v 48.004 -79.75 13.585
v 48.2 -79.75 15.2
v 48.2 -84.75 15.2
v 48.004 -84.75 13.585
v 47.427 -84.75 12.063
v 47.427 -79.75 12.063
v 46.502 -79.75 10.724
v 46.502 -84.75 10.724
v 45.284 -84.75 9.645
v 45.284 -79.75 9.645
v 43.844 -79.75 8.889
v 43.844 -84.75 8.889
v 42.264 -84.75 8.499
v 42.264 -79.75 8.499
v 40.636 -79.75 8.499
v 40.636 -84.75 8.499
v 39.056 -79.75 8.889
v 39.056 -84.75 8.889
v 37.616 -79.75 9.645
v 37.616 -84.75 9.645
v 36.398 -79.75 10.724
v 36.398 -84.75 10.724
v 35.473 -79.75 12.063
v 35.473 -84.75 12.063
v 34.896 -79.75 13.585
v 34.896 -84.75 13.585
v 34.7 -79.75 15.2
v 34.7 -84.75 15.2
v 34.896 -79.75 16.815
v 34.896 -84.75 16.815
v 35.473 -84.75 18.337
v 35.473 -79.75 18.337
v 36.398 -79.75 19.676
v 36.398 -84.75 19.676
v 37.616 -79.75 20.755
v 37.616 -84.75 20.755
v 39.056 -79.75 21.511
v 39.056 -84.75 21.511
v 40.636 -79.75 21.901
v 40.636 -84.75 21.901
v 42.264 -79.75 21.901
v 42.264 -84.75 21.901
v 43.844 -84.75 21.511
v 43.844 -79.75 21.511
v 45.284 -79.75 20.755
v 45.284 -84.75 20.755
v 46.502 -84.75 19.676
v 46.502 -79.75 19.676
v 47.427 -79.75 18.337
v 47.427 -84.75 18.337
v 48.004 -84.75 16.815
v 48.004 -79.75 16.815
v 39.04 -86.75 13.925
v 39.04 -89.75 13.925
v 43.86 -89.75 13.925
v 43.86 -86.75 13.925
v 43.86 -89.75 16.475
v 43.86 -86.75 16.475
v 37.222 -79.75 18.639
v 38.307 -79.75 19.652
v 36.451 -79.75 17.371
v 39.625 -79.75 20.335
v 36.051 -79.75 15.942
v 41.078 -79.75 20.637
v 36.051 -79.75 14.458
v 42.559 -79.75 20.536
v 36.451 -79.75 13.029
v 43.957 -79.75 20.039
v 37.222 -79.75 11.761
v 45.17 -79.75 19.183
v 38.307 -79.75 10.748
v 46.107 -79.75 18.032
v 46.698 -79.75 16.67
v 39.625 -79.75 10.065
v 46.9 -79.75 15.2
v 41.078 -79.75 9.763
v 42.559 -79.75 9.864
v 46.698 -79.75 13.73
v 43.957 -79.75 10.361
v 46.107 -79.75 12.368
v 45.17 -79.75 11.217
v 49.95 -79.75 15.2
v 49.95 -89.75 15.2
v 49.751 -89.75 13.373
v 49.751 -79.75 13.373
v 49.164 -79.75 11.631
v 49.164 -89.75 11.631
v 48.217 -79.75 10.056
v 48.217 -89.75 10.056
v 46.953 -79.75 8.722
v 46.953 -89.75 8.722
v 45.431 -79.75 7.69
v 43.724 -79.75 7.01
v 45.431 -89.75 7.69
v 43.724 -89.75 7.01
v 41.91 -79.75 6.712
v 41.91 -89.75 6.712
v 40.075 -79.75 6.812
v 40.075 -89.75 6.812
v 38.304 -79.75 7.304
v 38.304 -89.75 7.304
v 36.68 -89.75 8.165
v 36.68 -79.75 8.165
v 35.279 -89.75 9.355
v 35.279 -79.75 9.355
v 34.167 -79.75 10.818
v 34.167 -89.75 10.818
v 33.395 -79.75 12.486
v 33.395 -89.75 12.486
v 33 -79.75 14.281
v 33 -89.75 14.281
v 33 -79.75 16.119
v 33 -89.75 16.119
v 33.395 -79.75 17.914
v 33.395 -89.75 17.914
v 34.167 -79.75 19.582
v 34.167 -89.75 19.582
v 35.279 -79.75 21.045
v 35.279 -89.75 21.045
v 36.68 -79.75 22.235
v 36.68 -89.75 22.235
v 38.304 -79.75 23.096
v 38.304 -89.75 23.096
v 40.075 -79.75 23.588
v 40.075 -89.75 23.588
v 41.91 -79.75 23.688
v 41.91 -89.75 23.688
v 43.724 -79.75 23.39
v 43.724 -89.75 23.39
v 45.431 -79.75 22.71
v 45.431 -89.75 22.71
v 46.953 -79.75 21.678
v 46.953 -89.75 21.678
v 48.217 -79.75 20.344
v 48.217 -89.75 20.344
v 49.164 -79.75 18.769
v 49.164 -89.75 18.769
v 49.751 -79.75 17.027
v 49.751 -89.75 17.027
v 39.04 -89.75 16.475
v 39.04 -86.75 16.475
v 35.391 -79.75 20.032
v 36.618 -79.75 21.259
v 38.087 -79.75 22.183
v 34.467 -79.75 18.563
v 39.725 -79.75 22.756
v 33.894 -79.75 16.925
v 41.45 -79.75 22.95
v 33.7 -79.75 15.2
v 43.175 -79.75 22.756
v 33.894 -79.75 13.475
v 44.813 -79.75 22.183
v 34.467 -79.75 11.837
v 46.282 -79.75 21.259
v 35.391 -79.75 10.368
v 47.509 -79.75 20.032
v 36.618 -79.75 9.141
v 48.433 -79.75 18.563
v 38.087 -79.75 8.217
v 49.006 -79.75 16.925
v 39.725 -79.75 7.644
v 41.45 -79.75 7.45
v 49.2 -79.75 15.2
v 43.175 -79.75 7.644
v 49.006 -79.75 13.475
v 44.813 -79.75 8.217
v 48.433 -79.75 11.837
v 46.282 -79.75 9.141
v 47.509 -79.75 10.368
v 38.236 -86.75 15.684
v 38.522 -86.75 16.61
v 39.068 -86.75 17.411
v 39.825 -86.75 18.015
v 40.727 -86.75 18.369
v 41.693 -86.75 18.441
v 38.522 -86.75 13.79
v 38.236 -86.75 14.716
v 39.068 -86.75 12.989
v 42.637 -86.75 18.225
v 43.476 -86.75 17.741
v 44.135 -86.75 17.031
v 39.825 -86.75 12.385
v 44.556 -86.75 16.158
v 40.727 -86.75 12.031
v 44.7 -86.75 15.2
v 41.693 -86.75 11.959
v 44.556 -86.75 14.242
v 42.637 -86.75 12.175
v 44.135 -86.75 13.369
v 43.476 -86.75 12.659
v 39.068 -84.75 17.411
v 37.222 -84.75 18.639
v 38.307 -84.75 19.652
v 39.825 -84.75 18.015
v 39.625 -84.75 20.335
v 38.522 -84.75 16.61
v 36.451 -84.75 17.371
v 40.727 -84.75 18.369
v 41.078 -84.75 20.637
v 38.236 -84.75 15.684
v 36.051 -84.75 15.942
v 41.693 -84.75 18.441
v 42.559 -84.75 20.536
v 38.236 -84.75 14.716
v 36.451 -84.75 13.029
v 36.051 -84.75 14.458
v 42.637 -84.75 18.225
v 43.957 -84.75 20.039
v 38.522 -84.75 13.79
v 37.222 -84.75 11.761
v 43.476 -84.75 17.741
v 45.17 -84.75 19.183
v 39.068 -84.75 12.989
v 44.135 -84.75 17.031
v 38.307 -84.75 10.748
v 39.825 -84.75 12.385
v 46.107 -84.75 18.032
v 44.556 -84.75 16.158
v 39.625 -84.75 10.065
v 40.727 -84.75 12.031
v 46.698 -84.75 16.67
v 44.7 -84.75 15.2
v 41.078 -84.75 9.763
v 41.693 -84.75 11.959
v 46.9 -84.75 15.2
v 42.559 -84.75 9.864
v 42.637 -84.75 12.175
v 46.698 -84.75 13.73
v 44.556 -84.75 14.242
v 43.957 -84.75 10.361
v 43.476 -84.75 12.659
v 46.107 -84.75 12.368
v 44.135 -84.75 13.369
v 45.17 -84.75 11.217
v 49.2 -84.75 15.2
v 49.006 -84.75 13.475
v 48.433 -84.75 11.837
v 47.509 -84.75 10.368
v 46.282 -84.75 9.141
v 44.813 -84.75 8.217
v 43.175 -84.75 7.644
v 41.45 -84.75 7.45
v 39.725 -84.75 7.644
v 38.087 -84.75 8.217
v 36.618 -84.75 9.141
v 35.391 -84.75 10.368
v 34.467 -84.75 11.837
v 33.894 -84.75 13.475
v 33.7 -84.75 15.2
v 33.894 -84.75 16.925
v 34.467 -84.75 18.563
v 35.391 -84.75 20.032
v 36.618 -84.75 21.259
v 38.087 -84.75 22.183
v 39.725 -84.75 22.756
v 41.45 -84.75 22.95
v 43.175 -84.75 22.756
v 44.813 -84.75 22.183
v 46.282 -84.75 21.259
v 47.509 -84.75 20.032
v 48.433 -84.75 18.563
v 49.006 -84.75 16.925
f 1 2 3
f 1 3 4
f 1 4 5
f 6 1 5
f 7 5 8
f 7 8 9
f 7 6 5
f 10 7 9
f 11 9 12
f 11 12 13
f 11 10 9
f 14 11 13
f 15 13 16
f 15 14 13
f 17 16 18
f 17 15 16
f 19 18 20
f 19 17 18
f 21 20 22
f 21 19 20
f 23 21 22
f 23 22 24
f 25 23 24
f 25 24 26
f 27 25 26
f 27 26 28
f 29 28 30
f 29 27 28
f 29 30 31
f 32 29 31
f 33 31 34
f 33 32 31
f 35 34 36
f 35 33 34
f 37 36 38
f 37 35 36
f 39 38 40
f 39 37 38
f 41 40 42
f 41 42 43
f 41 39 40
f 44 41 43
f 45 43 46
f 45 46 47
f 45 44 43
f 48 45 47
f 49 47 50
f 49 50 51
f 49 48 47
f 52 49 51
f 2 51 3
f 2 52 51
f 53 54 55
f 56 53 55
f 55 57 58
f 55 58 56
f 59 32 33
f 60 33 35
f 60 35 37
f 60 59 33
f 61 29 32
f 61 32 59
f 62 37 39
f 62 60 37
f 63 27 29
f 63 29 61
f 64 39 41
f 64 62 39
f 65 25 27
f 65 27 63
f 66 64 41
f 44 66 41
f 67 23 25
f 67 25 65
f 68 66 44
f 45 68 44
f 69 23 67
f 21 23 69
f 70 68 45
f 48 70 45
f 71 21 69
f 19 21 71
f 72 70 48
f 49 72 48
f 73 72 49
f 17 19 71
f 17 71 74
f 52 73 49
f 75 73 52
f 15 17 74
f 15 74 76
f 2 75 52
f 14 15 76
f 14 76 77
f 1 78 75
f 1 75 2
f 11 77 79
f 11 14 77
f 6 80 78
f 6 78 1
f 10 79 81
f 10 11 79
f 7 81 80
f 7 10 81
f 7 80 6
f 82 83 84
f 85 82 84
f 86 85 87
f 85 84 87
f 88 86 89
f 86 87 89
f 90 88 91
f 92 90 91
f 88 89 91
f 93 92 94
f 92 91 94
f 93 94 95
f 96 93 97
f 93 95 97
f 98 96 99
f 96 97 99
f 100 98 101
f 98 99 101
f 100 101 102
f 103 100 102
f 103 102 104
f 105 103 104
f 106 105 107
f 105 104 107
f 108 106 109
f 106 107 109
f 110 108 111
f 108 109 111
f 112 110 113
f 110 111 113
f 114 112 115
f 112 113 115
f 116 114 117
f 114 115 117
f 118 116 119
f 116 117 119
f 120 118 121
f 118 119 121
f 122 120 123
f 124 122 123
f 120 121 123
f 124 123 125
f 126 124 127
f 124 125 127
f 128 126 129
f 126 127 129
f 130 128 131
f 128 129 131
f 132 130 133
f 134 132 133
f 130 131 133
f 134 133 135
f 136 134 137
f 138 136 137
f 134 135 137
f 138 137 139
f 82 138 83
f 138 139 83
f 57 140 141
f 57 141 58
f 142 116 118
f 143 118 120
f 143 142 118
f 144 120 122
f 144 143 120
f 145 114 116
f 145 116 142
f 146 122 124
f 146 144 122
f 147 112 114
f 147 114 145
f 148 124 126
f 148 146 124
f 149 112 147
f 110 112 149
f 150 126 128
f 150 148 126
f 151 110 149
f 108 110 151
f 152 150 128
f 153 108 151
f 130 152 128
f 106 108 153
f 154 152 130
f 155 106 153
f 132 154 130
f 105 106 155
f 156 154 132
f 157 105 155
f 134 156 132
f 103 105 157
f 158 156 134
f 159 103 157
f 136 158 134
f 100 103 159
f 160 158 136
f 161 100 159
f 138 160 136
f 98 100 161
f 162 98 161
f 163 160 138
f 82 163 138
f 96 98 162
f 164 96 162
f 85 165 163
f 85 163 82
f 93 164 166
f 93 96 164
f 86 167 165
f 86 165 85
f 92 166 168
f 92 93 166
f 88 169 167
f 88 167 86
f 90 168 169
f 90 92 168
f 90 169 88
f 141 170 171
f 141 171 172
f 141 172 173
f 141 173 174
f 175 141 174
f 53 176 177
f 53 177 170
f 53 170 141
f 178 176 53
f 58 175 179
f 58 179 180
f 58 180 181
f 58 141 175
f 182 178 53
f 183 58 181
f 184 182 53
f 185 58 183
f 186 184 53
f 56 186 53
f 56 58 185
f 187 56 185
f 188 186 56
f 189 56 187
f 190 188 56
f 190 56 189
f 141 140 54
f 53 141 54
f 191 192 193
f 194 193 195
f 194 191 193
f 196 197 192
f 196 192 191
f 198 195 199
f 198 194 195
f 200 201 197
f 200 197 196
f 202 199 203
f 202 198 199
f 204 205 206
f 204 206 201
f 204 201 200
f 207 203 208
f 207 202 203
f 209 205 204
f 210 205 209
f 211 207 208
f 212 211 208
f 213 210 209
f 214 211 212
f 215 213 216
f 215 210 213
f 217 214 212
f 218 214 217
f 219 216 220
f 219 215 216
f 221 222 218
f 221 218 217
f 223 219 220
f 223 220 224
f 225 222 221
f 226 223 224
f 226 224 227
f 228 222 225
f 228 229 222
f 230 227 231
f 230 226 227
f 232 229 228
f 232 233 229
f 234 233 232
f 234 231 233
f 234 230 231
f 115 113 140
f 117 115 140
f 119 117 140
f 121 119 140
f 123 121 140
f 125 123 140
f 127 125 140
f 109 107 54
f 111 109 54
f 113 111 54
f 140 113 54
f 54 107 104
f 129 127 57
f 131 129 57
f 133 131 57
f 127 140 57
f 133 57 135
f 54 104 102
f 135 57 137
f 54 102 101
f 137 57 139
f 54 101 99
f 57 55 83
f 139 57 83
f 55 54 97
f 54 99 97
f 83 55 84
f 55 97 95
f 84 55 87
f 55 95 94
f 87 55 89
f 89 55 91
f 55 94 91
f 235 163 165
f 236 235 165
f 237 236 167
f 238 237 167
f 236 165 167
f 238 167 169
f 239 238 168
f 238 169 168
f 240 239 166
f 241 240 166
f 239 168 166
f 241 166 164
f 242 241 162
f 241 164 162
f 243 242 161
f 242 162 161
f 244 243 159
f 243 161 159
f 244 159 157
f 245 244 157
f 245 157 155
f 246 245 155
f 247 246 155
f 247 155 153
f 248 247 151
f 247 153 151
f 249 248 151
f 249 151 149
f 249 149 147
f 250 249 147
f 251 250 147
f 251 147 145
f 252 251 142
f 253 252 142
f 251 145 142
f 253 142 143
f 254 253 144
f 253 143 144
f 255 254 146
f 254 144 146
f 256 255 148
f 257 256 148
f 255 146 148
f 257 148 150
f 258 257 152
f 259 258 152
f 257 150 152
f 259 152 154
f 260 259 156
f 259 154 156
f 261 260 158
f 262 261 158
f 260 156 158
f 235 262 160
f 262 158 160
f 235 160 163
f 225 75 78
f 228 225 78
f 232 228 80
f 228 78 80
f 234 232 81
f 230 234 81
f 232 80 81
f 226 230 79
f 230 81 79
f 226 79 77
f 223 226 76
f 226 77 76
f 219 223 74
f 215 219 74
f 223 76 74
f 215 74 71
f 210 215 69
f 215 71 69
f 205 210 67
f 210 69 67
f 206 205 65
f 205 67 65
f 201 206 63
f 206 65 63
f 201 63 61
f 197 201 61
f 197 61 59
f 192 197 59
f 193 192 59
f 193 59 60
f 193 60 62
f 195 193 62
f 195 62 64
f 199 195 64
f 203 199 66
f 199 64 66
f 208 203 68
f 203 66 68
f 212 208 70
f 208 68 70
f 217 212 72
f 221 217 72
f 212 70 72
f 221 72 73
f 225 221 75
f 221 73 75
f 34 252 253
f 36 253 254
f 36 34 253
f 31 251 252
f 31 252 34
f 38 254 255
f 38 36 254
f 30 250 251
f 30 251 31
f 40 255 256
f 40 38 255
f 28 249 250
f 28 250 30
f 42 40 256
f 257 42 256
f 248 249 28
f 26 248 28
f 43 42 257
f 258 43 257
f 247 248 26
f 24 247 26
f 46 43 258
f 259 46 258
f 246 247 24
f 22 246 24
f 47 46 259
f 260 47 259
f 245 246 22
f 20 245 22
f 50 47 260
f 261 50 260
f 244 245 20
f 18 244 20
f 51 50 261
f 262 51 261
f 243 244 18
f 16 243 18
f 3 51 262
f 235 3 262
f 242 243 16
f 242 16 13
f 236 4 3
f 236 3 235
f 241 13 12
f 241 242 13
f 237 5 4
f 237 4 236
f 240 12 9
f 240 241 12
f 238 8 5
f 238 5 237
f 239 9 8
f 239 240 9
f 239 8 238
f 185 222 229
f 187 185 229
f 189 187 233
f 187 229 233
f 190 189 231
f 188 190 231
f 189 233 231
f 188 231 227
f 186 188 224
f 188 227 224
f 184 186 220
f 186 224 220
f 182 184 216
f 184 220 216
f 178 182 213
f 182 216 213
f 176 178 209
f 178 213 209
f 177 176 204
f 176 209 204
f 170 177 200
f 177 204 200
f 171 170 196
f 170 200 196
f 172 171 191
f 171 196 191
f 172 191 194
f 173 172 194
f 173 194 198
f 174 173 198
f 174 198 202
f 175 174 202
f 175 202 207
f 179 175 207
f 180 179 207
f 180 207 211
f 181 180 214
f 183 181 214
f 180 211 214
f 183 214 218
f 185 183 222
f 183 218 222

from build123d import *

# Parameters (mm, degrees)
SKETCH020_R             = 8.5
SKETCH020_W             = 4.82
SKETCH020_H             = 2.55
PAD013_DEPTH            = 10
SKETCH021_R             = 7.75
SKETCH021_R_2           = 6.75
POCKET010_DEPTH         = 5
SKETCH022_R             = 5.45
POCKET011_DEPTH         = 5
SKETCH023_R             = 3.25
POCKET012_DEPTH         = 2
BODY006_PLACEMENT_ANGLE = 270


with BuildPart() as part:
    # Sketch020 → Pad013 (new body)
    with BuildSketch(Plane.XY):
        Circle(SKETCH020_R)
        Rectangle(SKETCH020_W, SKETCH020_H, mode=Mode.SUBTRACT)
    extrude(amount=PAD013_DEPTH)

    # Sketch021 (on Face7 of Pad013) → Pocket010 (cut)
    with BuildSketch(Plane.XY.offset(10)):
        Circle(SKETCH021_R)
        Circle(SKETCH021_R_2, mode=Mode.SUBTRACT)
    extrude(amount=-POCKET010_DEPTH, mode=Mode.SUBTRACT)

    # Sketch022 (on Face9 of Pocket010) → Pocket011 (cut)
    with BuildSketch(Plane.XY.offset(10)):
        Circle(SKETCH022_R)
    extrude(amount=-POCKET011_DEPTH, mode=Mode.SUBTRACT)

    # Sketch023 (on Face9 of Pocket011) → Pocket012 (cut)
    with BuildSketch(Plane.XY.offset(5)):
        Circle(SKETCH023_R)
    extrude(amount=-POCKET012_DEPTH, mode=Mode.SUBTRACT)


with BuildPart() as part_1:
    # Body006 placement: moved
    add(part.part.moved(Location((41.45, -89.75, 15.2))).rotate(Axis((41.45, -89.75, 15.2), (1, 0, 0)), BODY006_PLACEMENT_ANGLE))


solid = part_1.part
